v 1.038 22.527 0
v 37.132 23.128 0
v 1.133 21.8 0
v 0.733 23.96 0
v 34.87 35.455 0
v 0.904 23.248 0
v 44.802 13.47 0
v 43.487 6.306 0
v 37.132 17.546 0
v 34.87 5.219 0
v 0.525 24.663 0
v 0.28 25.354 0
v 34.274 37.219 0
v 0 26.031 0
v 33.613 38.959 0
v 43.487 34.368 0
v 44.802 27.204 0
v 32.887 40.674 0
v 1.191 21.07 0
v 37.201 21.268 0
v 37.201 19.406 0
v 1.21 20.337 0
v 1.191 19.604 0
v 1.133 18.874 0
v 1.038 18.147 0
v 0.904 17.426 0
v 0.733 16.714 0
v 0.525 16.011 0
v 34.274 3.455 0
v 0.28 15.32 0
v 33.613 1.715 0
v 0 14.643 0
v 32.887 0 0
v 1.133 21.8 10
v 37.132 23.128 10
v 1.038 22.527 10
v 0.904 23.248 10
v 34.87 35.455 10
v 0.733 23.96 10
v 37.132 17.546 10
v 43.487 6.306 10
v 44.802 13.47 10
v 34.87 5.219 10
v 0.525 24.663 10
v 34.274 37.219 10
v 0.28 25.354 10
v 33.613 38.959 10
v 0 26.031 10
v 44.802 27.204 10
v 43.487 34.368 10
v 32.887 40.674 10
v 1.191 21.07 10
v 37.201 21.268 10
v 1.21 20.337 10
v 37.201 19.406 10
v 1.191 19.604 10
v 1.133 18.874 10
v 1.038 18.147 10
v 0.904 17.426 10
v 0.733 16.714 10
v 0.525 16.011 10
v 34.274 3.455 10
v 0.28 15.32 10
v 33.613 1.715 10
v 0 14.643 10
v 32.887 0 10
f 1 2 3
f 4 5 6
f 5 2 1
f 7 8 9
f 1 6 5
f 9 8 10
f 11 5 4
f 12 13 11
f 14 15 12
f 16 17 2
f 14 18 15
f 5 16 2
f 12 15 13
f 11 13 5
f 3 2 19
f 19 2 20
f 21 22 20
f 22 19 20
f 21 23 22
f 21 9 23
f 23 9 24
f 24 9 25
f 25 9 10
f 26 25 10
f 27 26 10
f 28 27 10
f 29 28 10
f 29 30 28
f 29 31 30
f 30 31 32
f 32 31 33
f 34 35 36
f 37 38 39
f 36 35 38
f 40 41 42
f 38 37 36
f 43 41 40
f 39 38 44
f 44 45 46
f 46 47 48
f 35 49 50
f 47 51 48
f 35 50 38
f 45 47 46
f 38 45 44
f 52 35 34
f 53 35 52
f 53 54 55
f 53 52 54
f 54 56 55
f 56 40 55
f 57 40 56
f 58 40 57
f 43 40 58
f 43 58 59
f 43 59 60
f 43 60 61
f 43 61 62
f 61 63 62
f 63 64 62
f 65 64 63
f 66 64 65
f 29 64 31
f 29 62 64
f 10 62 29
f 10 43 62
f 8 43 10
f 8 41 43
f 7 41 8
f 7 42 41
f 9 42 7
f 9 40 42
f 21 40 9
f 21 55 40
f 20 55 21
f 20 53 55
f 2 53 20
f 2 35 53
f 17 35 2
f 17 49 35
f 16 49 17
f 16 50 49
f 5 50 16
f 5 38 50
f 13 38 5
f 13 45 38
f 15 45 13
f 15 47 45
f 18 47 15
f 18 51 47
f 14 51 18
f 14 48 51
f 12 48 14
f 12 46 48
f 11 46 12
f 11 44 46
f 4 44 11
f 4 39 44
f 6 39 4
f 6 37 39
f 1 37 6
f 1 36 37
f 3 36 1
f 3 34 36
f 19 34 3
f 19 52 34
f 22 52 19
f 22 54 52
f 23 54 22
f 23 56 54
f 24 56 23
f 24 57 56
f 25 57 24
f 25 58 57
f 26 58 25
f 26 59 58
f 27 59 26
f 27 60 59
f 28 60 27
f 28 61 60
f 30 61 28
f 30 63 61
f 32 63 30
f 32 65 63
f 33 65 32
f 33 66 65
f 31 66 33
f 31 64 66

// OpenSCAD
$fn = 32;

// ----------------------------------------------------------------------
// Gear sector: 2 teeth on 48 degrees
// ----------------------------------------------------------------------

// --- parameters (mm) ---
sector_angle = 48;        // sector angle, degrees
root_r = 50;              // root circle radius
tooth_h = 8;              // tooth height over the root circle
teeth = 2;                // number of teeth on the sector
hub_r = 14;               // hub bore radius
plate_t = 10;             // sector thickness, Z
arc_step = 3;             // sampling step of the root/hub arcs, degrees
fit_tol = 0.05;           // declared fit tolerance (prompt contract)
free_tol = 0.3;           // declared free tolerance (prompt contract)

tip_r = root_r + tooth_h;  // tip circle radius

profile = [[32.887, 0], [33.613, 1.715], [34.274, 3.455], [34.87, 5.219], [43.487, 6.306], [44.802, 13.47], [37.132, 17.546], [37.201, 19.406], [37.201, 21.268], [37.132, 23.128], [44.802, 27.204], [43.487, 34.368], [34.87, 35.455], [34.274, 37.219], [33.613, 38.959], [32.887, 40.674], [0, 26.031], [0.28, 25.354], [0.525, 24.663], [0.733, 23.96], [0.904, 23.248], [1.038, 22.527], [1.133, 21.8], [1.191, 21.07], [1.21, 20.337], [1.191, 19.604], [1.133, 18.874], [1.038, 18.147], [0.904, 17.426], [0.733, 16.714], [0.525, 16.011], [0.28, 15.32], [0, 14.643]];  // primary outline, 33 points, counter clockwise

// --- the one profile operation ---
linear_extrude(height = plate_t) polygon(points = profile);
